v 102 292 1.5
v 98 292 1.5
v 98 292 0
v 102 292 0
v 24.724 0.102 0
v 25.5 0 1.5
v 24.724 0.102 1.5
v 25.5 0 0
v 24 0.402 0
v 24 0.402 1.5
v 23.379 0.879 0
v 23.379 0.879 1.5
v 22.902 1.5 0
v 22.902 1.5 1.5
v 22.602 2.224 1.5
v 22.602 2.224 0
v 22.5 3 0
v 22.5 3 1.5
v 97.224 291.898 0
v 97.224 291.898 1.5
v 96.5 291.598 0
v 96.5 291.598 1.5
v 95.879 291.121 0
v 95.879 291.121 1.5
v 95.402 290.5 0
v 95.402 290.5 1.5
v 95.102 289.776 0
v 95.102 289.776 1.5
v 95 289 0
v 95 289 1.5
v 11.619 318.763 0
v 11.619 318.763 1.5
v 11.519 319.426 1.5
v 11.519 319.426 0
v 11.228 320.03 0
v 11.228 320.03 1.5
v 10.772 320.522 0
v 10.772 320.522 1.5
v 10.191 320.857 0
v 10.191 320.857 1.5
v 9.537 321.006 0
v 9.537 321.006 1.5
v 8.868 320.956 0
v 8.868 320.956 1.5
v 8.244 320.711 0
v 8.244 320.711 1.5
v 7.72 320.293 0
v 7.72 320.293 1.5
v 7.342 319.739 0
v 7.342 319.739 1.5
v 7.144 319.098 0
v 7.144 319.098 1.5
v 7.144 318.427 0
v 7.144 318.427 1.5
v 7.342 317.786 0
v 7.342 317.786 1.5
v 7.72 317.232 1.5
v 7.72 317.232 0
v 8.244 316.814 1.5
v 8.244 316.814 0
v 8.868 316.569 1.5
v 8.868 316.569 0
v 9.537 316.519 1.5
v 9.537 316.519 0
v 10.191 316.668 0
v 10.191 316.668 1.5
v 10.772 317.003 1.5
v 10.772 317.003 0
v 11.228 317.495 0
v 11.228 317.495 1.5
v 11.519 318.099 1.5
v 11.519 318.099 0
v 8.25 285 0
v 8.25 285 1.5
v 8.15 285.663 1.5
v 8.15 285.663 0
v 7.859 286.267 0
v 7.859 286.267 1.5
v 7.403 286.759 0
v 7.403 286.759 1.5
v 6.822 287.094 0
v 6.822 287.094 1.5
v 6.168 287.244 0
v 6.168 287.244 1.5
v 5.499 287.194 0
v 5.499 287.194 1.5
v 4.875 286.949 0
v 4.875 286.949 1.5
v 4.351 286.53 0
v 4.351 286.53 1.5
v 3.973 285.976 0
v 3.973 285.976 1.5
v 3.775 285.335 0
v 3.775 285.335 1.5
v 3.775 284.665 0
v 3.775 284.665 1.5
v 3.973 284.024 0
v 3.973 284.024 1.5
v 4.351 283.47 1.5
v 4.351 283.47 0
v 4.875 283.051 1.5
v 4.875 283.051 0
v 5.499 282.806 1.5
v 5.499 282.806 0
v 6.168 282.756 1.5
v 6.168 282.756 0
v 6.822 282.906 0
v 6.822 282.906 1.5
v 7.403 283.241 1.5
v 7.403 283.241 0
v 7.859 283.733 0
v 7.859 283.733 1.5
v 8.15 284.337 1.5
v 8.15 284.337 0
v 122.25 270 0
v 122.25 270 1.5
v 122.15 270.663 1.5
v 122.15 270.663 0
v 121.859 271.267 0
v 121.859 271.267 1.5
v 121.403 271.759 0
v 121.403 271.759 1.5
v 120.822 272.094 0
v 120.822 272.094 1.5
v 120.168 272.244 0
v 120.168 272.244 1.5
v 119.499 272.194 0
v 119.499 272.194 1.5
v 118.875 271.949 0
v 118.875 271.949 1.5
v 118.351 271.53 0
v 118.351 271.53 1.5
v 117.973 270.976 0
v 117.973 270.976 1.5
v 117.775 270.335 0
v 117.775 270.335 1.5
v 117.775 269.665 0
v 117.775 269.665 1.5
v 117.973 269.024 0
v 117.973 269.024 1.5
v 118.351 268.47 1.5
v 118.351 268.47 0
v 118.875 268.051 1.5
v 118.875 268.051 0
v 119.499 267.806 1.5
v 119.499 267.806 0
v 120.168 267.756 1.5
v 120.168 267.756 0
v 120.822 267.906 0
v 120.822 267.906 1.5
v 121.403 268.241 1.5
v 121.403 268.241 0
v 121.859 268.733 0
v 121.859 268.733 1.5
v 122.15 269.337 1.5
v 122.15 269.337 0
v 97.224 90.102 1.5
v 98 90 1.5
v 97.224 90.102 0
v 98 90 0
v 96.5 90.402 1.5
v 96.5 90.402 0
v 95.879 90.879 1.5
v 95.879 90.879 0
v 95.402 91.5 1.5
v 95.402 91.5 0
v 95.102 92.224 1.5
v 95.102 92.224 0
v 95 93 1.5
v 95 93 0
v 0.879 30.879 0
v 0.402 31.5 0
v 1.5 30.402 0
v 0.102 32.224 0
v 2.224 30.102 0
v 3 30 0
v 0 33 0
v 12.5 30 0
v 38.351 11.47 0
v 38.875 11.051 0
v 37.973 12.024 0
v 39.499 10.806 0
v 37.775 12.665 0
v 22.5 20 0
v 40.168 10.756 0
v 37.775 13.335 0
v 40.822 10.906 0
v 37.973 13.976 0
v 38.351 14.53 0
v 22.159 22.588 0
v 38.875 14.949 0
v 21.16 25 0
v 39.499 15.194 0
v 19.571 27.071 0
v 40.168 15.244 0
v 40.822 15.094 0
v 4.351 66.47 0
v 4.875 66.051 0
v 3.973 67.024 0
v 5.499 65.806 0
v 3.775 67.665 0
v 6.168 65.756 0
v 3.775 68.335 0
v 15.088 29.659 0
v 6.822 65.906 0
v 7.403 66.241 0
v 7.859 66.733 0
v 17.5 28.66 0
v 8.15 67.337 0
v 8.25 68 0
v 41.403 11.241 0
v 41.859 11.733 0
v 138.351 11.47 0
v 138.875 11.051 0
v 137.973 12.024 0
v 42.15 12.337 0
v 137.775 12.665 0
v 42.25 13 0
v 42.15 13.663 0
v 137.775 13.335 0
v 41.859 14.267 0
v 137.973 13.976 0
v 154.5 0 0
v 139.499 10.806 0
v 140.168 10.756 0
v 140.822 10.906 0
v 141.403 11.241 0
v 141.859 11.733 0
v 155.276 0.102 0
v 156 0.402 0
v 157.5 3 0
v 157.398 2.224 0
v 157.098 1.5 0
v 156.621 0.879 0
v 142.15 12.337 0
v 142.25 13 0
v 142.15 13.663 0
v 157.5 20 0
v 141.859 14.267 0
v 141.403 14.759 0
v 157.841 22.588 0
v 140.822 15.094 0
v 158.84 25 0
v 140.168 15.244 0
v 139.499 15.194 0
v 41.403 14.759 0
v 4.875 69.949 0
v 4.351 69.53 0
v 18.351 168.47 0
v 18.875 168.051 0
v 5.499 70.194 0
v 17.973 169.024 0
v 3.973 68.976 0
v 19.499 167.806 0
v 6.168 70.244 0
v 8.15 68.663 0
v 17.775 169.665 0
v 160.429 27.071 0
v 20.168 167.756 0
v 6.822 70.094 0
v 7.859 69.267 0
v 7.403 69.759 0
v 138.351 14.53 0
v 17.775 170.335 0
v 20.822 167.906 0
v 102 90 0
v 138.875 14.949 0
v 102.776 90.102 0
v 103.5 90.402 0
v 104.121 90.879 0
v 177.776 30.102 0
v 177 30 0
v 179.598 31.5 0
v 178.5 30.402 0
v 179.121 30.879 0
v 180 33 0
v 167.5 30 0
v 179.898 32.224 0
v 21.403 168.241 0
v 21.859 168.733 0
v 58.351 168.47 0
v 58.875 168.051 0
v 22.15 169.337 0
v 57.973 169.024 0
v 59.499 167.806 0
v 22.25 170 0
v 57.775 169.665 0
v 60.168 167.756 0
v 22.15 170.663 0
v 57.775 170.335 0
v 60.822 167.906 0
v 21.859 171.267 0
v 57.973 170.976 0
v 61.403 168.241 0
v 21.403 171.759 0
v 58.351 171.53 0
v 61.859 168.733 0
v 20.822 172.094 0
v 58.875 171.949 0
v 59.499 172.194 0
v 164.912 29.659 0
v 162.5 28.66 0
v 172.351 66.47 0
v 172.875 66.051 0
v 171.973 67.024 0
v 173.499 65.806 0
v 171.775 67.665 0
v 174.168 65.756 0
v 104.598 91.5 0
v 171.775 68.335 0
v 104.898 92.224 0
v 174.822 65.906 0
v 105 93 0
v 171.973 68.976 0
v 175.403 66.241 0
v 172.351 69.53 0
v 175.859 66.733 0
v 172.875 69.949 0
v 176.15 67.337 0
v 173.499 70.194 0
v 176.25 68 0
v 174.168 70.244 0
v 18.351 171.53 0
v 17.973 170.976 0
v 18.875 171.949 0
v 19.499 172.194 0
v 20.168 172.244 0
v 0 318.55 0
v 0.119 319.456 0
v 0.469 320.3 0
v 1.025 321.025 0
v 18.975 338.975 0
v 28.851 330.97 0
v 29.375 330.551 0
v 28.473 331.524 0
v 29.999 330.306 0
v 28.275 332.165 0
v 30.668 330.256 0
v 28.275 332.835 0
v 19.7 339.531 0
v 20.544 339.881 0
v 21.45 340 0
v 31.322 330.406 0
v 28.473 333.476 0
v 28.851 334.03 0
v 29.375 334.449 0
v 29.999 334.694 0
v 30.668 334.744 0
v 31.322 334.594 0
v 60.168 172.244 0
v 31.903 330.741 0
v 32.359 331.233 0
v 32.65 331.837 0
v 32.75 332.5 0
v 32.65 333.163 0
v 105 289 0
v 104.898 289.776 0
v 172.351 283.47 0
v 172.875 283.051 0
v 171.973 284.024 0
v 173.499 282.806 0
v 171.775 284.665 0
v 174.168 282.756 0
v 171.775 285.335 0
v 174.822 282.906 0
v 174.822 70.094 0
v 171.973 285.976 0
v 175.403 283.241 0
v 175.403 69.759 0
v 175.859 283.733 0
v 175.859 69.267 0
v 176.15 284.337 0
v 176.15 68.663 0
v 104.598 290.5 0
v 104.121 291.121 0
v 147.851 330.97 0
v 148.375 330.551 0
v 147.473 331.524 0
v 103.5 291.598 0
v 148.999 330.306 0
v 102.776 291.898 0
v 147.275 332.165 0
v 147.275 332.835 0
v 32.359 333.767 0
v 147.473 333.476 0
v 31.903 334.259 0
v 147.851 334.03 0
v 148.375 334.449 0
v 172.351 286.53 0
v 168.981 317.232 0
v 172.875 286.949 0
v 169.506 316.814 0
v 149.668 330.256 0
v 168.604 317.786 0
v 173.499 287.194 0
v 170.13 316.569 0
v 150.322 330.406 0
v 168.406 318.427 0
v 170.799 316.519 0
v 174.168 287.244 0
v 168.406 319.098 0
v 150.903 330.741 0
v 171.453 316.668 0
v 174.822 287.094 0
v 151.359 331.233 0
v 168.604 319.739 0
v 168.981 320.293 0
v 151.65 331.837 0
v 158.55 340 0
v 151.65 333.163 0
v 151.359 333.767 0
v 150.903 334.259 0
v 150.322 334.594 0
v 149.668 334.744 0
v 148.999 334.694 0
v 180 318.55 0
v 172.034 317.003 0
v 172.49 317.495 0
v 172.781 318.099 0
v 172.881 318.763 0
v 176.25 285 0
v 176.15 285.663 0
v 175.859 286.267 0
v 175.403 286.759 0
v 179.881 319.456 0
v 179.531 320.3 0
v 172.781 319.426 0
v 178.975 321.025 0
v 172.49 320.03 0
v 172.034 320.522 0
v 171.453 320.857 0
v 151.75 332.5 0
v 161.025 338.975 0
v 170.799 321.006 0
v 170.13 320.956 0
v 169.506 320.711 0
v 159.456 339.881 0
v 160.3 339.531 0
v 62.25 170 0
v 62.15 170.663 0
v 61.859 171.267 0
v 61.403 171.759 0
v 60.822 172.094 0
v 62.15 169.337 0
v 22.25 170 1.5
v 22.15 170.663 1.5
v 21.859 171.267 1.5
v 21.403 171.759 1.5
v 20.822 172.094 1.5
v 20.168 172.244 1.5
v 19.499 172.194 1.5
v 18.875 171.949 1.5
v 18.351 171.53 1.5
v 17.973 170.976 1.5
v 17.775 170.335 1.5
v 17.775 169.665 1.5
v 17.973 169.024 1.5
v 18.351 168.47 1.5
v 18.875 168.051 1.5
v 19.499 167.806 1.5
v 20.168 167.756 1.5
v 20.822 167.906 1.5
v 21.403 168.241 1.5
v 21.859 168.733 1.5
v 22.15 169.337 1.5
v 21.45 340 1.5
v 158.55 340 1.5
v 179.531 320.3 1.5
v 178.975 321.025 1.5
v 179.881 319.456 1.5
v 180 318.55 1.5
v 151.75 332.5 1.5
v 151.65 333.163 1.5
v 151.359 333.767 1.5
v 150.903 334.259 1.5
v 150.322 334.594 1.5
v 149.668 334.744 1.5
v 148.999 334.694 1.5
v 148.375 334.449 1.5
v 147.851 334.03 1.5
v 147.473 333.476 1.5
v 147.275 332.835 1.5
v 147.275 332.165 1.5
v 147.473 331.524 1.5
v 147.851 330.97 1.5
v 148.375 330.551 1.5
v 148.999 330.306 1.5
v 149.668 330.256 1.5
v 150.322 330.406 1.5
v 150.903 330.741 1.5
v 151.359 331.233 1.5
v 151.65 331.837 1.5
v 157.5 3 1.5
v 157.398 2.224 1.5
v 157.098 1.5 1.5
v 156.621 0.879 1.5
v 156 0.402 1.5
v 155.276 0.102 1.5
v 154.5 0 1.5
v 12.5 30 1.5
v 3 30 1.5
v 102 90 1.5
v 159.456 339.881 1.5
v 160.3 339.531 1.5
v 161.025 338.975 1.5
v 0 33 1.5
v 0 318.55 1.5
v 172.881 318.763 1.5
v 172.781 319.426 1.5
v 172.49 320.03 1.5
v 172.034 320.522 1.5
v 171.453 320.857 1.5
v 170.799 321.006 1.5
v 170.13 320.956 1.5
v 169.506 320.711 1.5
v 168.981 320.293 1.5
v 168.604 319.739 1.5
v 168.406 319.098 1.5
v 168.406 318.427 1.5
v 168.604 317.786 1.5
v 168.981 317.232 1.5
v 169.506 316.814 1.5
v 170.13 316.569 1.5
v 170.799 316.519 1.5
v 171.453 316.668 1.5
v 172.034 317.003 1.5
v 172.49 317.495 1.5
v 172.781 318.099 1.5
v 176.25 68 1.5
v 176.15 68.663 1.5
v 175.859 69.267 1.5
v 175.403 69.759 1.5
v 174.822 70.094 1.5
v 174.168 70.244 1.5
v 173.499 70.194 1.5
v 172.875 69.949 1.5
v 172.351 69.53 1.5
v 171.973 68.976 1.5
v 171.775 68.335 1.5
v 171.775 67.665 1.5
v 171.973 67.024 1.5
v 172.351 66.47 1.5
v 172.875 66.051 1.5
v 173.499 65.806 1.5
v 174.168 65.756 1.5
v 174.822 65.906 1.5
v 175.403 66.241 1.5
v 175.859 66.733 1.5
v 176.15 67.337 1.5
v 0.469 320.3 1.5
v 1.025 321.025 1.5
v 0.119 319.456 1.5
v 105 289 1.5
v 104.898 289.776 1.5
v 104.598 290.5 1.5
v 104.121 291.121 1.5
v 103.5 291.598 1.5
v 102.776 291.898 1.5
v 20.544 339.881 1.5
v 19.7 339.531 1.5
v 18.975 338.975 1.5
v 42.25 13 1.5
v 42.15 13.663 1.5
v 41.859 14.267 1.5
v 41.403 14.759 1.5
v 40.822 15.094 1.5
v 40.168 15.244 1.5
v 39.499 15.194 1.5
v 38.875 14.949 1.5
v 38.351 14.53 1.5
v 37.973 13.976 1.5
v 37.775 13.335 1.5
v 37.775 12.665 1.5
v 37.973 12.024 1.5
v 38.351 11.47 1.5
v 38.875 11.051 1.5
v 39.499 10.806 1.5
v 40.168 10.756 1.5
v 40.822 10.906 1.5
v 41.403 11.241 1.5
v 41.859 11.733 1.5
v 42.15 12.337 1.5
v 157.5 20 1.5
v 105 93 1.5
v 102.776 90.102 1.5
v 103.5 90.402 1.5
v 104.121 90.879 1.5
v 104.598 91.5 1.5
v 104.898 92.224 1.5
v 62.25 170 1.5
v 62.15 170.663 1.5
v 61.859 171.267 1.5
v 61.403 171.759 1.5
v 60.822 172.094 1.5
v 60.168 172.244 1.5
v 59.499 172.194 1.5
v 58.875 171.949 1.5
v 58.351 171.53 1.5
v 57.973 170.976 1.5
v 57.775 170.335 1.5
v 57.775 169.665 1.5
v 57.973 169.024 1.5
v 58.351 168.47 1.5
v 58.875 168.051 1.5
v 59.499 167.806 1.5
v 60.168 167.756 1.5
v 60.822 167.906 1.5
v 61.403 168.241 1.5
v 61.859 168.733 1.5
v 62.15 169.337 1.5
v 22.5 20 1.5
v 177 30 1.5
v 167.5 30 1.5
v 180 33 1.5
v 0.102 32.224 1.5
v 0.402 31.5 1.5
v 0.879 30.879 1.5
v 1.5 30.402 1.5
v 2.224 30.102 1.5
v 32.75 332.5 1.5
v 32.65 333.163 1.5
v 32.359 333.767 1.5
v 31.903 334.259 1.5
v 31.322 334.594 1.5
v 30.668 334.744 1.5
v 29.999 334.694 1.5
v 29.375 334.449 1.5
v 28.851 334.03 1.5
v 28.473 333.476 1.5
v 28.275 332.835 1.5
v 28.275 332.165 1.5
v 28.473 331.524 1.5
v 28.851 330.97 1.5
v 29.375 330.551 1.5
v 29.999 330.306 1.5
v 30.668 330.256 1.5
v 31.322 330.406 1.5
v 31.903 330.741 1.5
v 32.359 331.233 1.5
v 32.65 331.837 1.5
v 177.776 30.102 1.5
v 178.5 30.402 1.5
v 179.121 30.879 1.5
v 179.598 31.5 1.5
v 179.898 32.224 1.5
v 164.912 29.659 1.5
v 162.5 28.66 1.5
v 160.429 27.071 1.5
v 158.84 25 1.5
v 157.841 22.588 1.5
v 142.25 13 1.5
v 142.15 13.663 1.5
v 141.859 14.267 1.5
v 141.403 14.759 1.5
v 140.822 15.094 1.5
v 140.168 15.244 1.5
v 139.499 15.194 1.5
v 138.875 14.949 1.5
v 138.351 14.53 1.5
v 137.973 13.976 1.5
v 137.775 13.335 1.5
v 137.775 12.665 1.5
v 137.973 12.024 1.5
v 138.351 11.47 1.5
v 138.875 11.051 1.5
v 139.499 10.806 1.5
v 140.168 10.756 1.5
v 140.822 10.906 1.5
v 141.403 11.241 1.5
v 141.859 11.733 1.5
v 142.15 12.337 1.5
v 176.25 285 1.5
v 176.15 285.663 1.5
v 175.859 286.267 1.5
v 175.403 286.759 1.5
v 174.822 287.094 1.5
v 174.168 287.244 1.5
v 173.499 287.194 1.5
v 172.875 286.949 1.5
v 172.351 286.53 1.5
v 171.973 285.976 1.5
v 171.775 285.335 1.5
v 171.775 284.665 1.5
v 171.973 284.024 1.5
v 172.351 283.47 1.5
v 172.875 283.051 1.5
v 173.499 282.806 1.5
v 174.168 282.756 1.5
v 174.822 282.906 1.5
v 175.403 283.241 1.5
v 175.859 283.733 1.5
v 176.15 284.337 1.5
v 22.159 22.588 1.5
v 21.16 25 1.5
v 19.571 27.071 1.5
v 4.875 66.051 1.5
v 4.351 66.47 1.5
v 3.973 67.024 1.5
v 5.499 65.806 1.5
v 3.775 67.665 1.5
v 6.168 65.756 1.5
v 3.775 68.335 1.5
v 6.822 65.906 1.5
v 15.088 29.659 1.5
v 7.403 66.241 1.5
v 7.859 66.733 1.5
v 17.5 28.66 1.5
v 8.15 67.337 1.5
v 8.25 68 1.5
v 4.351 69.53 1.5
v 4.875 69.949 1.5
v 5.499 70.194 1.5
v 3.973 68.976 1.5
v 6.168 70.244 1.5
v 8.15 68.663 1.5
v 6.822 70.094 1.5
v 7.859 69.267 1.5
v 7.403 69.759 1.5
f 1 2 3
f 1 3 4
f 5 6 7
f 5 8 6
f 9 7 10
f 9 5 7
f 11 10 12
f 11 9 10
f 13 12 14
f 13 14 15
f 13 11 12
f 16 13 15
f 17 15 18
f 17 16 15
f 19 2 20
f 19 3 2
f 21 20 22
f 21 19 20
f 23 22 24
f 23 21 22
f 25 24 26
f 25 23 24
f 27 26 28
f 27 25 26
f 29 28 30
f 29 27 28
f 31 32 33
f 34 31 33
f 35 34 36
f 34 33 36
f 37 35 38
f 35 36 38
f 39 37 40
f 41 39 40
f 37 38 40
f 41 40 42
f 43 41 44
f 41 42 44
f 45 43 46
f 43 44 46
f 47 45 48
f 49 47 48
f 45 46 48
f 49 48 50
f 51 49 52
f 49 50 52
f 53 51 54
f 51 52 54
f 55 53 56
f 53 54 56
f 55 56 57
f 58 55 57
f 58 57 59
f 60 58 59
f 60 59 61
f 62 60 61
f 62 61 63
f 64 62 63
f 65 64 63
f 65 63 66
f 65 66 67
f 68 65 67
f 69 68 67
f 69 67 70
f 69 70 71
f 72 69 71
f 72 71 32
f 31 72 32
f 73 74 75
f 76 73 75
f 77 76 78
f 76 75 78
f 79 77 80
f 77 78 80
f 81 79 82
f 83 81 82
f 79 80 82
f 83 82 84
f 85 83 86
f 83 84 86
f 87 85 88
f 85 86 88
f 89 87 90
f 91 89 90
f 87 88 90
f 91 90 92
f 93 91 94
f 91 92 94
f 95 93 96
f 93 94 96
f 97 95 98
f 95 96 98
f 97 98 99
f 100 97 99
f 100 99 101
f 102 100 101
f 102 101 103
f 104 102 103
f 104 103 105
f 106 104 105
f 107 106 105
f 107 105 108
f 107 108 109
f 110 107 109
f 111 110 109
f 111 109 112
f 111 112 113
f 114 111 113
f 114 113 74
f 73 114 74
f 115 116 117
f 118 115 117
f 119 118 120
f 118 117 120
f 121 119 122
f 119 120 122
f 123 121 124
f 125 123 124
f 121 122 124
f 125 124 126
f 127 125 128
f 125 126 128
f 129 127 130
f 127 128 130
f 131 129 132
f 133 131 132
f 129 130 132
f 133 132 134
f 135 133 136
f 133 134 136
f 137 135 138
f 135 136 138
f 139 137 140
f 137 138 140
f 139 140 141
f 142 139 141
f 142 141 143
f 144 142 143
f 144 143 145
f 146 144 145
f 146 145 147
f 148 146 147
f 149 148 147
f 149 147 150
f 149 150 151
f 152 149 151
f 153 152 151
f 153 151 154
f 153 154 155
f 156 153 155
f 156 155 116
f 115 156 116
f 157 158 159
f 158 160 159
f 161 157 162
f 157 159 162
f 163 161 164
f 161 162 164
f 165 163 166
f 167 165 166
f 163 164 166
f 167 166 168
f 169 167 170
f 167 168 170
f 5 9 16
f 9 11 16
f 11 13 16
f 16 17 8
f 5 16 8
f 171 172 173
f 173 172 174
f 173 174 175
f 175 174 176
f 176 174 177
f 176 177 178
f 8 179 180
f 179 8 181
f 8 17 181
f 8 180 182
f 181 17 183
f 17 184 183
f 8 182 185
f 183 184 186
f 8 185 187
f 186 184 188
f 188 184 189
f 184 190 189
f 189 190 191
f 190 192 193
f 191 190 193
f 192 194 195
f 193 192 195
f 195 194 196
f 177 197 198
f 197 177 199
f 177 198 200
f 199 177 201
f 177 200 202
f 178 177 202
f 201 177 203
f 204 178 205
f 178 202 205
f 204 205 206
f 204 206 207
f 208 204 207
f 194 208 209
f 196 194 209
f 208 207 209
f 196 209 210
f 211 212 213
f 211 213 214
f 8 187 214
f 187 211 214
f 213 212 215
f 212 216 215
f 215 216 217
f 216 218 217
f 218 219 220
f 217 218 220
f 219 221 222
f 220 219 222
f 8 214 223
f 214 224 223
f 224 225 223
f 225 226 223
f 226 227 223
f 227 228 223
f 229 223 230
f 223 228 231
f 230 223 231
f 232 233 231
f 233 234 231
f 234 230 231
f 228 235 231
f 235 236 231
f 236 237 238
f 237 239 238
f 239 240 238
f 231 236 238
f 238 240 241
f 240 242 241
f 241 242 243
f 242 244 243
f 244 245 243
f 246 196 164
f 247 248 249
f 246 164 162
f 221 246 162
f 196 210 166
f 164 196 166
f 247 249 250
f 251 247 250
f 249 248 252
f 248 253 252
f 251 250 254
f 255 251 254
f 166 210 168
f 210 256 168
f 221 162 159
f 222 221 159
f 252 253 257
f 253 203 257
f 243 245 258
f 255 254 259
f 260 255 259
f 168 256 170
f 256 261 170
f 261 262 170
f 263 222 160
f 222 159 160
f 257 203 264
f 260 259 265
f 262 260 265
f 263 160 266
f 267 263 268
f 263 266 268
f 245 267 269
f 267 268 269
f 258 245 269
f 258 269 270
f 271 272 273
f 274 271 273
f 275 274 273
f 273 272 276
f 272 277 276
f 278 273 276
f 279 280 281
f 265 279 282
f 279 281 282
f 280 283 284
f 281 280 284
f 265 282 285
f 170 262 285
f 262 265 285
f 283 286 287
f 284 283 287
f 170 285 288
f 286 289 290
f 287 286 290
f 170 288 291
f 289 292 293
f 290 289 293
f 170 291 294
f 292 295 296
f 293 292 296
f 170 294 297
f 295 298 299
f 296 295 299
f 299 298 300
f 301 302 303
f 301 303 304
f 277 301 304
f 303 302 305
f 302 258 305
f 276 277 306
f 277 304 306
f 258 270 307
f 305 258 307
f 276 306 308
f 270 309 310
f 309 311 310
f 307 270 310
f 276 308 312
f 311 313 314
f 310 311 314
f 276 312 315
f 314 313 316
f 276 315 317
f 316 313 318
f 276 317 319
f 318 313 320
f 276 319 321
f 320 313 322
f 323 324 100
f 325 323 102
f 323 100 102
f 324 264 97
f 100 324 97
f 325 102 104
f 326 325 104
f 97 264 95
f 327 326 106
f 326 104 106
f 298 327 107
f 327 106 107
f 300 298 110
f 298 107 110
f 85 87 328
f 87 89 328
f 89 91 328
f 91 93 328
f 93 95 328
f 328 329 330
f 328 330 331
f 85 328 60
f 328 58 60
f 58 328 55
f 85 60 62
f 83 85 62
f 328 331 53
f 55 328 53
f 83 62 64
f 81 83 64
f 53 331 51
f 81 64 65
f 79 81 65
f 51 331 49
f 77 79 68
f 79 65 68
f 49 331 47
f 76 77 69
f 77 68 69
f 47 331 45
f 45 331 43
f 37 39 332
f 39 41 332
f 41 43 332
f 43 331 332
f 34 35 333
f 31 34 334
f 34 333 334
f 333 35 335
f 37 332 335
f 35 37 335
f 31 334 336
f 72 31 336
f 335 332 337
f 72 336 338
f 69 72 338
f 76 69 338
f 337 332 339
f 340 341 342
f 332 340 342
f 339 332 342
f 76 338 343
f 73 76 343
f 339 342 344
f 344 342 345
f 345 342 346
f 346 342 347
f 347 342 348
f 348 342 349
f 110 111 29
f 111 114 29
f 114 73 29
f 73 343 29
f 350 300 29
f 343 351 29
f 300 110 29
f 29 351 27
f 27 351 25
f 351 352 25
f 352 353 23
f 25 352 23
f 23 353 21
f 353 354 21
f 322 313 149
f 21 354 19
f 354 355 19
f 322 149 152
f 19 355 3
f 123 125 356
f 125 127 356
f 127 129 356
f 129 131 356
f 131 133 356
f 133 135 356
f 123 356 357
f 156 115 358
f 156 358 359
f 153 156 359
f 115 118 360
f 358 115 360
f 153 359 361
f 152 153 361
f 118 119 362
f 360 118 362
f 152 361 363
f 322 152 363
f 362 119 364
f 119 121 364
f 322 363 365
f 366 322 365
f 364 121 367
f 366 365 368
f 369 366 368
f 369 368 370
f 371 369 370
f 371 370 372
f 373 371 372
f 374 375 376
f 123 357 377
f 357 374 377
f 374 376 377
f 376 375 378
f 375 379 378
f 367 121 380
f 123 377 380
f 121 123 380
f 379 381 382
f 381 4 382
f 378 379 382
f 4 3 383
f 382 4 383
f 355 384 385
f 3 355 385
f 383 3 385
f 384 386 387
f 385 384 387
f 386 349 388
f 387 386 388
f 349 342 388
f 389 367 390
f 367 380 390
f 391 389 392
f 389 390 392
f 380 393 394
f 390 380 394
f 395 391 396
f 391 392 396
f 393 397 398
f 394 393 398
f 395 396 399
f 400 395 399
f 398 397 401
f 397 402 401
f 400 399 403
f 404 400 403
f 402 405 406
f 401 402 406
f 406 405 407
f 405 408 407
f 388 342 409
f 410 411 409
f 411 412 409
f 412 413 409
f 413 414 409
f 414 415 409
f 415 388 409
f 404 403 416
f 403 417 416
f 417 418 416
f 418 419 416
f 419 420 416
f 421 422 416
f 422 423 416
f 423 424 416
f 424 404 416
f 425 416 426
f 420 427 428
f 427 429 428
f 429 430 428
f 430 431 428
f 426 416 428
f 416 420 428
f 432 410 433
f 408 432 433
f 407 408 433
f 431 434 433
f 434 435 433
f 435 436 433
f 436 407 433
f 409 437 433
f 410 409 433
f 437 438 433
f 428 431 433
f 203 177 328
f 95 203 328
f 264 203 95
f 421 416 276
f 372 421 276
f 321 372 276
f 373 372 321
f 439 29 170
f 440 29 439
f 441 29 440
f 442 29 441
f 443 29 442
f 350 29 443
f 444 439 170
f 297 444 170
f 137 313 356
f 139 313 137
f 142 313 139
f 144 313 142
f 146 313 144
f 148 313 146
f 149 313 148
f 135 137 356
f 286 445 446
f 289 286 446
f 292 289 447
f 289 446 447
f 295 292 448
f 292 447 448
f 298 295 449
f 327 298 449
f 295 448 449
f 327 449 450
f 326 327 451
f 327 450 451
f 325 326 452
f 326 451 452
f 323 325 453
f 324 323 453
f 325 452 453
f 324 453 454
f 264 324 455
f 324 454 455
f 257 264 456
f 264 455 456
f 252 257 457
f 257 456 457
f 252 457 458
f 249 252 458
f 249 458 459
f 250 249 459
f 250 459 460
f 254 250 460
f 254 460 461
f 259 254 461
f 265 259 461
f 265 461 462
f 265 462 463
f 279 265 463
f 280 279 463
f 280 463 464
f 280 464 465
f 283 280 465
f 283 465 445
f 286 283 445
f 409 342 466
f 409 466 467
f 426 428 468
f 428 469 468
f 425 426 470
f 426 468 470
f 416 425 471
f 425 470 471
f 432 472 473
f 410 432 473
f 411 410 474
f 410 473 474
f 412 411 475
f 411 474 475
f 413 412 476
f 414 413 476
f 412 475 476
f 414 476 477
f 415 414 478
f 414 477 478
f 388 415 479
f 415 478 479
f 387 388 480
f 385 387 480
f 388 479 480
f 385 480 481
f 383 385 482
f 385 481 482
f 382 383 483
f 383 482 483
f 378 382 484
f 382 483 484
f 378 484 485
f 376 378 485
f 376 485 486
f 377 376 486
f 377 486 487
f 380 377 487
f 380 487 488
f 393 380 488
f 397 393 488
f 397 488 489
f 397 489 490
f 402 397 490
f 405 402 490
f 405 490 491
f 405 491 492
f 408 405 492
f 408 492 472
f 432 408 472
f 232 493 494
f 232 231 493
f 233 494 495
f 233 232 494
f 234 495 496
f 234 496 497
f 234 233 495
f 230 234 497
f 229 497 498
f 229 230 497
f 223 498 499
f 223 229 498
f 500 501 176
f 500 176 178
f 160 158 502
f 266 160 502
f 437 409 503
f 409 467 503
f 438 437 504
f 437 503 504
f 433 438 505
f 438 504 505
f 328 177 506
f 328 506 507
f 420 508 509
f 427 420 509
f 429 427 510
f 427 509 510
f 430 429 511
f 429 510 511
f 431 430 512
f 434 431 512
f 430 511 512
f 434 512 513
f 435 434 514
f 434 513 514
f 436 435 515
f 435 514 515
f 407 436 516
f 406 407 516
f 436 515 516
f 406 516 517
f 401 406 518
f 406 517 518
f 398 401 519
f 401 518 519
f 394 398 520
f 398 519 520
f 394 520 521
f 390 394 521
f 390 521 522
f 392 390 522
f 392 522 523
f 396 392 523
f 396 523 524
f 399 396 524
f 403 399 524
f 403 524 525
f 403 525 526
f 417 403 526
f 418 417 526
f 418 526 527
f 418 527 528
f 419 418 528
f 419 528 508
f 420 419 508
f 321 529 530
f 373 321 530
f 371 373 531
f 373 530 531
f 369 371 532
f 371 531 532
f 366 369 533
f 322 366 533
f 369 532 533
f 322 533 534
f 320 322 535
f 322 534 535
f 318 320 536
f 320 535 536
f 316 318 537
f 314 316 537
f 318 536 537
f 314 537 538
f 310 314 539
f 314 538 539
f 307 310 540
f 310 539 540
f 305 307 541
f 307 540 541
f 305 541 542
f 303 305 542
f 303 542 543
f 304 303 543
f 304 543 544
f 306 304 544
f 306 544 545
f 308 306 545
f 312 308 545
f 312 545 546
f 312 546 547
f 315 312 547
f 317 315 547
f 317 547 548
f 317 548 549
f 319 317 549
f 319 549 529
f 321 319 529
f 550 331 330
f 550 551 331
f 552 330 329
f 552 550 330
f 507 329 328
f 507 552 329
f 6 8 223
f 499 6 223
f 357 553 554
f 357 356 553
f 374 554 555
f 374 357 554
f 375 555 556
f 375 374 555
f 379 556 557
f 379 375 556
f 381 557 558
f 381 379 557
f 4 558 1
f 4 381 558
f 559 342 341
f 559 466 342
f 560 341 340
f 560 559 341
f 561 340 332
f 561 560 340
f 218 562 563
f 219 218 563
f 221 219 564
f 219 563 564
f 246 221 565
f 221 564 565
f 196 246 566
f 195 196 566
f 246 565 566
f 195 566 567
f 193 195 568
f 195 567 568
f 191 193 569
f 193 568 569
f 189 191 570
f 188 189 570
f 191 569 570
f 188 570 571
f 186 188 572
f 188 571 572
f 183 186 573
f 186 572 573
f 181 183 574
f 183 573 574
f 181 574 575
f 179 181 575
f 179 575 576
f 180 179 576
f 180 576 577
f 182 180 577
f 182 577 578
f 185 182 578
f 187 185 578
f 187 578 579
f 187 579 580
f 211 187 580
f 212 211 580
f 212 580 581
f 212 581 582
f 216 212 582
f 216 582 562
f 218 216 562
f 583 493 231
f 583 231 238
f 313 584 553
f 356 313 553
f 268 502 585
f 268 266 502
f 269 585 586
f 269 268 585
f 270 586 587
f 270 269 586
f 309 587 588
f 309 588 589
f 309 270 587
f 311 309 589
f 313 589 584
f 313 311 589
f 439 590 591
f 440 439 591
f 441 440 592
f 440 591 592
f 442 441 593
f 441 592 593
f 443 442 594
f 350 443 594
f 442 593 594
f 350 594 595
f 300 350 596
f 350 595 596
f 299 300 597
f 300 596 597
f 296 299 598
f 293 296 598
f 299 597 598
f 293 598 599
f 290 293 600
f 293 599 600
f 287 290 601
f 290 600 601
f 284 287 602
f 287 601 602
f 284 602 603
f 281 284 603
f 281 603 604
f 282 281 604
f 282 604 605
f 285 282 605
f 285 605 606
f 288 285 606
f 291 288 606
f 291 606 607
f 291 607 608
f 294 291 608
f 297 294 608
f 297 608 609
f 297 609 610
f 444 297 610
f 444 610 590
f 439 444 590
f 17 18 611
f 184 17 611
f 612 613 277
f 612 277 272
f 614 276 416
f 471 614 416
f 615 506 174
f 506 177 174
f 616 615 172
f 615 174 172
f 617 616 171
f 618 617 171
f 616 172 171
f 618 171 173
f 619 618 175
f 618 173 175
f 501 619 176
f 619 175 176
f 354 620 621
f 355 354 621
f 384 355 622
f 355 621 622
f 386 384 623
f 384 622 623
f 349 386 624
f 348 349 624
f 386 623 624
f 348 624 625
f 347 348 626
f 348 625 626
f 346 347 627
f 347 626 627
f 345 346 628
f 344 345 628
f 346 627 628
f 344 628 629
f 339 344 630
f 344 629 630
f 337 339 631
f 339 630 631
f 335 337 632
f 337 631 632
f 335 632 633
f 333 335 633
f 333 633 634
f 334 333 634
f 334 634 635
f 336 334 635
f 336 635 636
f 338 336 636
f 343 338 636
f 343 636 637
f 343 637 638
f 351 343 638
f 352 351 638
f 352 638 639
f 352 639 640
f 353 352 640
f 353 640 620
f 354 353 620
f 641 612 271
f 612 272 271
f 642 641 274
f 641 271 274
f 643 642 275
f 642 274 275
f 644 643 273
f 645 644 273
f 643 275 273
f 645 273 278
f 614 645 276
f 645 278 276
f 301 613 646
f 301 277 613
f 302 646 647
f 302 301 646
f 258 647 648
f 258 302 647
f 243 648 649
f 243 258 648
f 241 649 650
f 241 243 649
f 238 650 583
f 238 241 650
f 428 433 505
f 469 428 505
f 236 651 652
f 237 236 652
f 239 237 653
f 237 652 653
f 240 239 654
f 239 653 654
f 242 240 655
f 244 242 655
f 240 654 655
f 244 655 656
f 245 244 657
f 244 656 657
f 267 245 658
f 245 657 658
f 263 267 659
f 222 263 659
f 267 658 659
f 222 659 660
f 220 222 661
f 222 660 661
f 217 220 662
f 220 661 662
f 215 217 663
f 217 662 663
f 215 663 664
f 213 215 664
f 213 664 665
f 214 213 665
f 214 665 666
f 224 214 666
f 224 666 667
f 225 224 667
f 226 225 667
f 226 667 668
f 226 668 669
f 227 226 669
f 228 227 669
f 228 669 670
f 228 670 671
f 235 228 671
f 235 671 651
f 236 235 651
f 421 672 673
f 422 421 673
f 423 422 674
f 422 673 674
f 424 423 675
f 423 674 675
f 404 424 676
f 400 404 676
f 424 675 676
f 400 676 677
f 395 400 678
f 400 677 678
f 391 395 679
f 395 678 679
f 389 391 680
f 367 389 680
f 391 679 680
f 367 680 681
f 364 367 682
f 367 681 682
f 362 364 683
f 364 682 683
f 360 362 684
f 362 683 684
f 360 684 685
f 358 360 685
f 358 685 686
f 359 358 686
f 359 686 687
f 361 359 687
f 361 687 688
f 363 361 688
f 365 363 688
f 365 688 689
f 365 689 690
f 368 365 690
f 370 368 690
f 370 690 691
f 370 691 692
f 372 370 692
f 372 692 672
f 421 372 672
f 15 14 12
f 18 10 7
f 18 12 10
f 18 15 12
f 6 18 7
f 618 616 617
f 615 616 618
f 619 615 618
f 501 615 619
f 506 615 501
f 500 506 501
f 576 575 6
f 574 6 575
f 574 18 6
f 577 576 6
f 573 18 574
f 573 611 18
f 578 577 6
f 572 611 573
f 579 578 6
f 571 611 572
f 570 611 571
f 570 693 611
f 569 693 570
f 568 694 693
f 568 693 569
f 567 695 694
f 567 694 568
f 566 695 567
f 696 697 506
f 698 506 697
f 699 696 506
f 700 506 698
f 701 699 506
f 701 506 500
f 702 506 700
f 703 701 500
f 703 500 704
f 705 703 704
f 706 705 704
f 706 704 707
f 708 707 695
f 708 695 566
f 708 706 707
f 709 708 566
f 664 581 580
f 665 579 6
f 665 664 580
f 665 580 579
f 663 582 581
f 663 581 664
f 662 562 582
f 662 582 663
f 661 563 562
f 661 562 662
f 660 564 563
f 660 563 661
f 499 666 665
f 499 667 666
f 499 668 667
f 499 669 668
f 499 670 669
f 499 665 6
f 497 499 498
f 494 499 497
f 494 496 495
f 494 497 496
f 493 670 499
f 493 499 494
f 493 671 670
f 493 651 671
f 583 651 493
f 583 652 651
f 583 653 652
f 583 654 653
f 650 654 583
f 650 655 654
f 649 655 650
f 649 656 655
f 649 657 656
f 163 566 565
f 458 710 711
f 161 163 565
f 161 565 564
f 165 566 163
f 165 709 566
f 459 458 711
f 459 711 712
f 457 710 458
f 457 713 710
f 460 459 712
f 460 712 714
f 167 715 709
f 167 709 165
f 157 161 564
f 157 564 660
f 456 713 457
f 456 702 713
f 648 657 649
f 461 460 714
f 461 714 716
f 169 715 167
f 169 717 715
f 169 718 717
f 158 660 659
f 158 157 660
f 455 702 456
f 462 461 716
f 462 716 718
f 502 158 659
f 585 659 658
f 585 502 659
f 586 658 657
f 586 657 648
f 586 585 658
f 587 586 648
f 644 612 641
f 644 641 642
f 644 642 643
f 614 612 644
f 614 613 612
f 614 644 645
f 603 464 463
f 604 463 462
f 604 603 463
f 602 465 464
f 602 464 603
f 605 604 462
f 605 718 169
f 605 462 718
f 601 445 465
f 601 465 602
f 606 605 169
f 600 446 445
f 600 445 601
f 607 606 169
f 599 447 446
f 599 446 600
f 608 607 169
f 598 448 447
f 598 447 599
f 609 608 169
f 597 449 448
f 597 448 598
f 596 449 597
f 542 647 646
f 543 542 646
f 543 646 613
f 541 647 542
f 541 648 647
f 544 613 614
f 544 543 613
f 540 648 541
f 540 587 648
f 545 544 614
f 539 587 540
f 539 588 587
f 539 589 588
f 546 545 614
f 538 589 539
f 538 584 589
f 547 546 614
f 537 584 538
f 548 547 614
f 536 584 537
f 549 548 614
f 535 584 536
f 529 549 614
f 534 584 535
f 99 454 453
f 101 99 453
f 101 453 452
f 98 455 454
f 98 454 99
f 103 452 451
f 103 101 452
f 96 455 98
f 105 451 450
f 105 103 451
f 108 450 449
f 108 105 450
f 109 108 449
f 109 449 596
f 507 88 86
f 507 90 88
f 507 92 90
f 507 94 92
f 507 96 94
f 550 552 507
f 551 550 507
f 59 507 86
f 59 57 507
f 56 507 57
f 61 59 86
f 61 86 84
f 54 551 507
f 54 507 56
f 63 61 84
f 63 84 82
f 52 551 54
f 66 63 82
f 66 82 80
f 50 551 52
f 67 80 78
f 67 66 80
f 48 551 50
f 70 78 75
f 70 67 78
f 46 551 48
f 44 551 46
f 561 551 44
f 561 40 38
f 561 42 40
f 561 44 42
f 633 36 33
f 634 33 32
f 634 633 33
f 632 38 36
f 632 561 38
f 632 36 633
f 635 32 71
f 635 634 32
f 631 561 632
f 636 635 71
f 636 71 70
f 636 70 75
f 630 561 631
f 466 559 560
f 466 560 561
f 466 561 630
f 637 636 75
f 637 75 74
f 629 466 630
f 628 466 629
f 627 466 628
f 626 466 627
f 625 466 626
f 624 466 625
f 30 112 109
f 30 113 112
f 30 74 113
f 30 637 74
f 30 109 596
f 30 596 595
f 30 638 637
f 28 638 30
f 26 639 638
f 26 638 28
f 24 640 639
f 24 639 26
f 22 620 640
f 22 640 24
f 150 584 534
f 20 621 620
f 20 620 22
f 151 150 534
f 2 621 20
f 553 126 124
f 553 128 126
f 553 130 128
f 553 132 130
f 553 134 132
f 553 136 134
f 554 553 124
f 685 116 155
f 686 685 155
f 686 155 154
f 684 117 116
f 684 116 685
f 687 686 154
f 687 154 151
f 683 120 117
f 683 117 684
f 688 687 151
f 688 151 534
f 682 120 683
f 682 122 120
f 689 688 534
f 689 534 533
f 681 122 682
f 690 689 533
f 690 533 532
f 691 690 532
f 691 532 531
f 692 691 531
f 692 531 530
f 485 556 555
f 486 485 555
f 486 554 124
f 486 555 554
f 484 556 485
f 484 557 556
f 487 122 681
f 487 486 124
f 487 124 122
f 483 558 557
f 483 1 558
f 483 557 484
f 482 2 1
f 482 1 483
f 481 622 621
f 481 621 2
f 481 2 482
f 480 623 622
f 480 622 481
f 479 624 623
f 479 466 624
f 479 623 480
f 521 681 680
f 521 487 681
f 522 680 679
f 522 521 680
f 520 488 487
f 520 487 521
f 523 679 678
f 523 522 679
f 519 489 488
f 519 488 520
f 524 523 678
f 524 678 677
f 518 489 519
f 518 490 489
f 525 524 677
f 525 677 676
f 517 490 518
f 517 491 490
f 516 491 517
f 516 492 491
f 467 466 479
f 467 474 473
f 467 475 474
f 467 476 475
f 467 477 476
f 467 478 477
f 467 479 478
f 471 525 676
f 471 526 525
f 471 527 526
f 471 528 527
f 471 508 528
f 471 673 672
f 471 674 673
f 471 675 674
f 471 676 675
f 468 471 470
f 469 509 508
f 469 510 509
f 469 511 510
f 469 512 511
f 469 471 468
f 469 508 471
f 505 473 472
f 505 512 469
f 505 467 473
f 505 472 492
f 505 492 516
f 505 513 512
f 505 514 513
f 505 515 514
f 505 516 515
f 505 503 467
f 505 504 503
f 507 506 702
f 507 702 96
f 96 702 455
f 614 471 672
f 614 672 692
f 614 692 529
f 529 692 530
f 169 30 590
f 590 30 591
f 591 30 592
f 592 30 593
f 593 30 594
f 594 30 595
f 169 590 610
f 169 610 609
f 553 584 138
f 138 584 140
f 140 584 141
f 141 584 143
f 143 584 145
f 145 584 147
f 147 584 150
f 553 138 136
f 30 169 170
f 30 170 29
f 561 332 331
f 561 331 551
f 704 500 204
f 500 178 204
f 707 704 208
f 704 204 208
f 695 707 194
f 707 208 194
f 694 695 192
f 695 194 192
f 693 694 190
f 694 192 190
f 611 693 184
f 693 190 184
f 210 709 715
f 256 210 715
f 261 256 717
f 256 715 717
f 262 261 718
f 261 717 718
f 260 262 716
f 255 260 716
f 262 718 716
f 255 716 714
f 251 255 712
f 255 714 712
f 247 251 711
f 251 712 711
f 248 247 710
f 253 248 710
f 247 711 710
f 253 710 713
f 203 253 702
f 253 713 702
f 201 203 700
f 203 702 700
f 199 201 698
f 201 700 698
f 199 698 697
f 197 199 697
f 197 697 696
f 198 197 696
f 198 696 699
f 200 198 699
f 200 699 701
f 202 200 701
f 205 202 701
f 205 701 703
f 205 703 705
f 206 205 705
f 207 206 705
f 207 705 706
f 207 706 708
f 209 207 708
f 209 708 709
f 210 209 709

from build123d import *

# Parameters (mm, degrees)
ESQUISSE1_W                  = 180
ESQUISSE1_H                  = 340
BOSS_EXTRU_1_DEPTH           = 1.5
ESQUISSE2_R                  = 2.25
ENL_V_MAT_EXTRU_1_DEPTH      = 1
ENL_V_MAT_EXTRU_1_DEPTH_BACK = 2.5
ESQUISSE3_W                  = 22.5
ESQUISSE3_H                  = 30
ENL_V_MAT_EXTRU_2_DEPTH      = 1
ENL_V_MAT_EXTRU_2_DEPTH_BACK = 2.5
CONG_1_R                     = 10
CONG_2_R                     = 3
ESQUISSE4_W                  = 10
ESQUISSE4_H                  = 202
ENL_V_MAT_EXTRU_3_DEPTH      = 1
ENL_V_MAT_EXTRU_3_DEPTH_BACK = 2.5
CONG_3_R                     = 3
CHANFREIN1_SIZE              = 20
CHANFREIN2_SIZE              = 20
ESQUISSE5_R                  = 2.25
ENL_V_MAT_EXTRU_4_DEPTH      = 2.5
ESQUISSE6_R                  = 2.25
ENL_V_MAT_EXTRU_5_DEPTH      = 1
ENL_V_MAT_EXTRU_5_DEPTH_BACK = 2.5
CONG_4_R                     = 3.5


with BuildPart() as part:
    # Esquisse1 → Boss.-Extru.1 (new body)
    with BuildSketch(Plane.XY):
        with Locations((90, 170)):
            Rectangle(ESQUISSE1_W, ESQUISSE1_H)
    extrude(amount=BOSS_EXTRU_1_DEPTH)

    # Esquisse2 → Enlèv. mat.-Extru.1 (cut, two sides)
    with BuildSketch(Plane.XY.offset(1.5)) as enl_v_mat_extru_1_sk:
        with Locations((40, 13)):
            Circle(ESQUISSE2_R)
        with Locations((140, 13)):
            Circle(ESQUISSE2_R)
    extrude(amount=ENL_V_MAT_EXTRU_1_DEPTH, mode=Mode.SUBTRACT)
    extrude(enl_v_mat_extru_1_sk.sketch, amount=-ENL_V_MAT_EXTRU_1_DEPTH_BACK, mode=Mode.SUBTRACT)

    # Esquisse3 → Enlèv. mat.-Extru.2 (cut, two sides)
    with BuildSketch(Plane.XY.offset(1.5)) as enl_v_mat_extru_2_sk:
        with Locations((11.25, 15)):
            Rectangle(ESQUISSE3_W, ESQUISSE3_H)
        with Locations((168.75, 15)):
            Rectangle(ESQUISSE3_W, ESQUISSE3_H)
    extrude(amount=ENL_V_MAT_EXTRU_2_DEPTH, mode=Mode.SUBTRACT)
    extrude(enl_v_mat_extru_2_sk.sketch, amount=-ENL_V_MAT_EXTRU_2_DEPTH_BACK, mode=Mode.SUBTRACT)

    # Congé1
    cong_1_edges = [part.edges().sort_by_distance(p)[0] for p in [
        (22.5, 30, 0.75),
        (157.5, 30, 0.75),
    ]]
    fillet(cong_1_edges, radius=CONG_1_R)

    # Congé2
    cong_2_edges = [part.edges().sort_by_distance(p)[0] for p in [
        (0, 30, 0.75),
        (22.5, 0, 0.75),
        (180, 30, 0.75),
        (157.5, 0, 0.75),
    ]]
    fillet(cong_2_edges, radius=CONG_2_R)

    # Esquisse4 → Enlèv. mat.-Extru.3 (cut, two sides)
    with BuildSketch(Plane.XY.offset(1.5)) as enl_v_mat_extru_3_sk:
        with Locations((100, 191)):
            Rectangle(ESQUISSE4_W, ESQUISSE4_H)
    extrude(amount=ENL_V_MAT_EXTRU_3_DEPTH, mode=Mode.SUBTRACT)
    extrude(enl_v_mat_extru_3_sk.sketch, amount=-ENL_V_MAT_EXTRU_3_DEPTH_BACK, mode=Mode.SUBTRACT)

    # Congé3
    cong_3_edges = [part.edges().sort_by_distance(p)[0] for p in [
        (95, 90, 0.75),
        (95, 292, 0.75),
        (105, 292, 0.75),
        (105, 90, 0.75),
    ]]
    fillet(cong_3_edges, radius=CONG_3_R)

    # Chanfrein1
    chanfrein1_edges = [part.edges().sort_by_distance(p)[0] for p in [
        (180, 340, 0.75),
    ]]
    chamfer(chanfrein1_edges, length=CHANFREIN1_SIZE)

    # Chanfrein2
    chanfrein2_edges = [part.edges().sort_by_distance(p)[0] for p in [
        (0, 340, 0.75),
    ]]
    chamfer(chanfrein2_edges, length=CHANFREIN2_SIZE)

    # Esquisse5 → Enlèv. mat.-Extru.4 (cut, through all)
    with BuildSketch(Plane.XY.offset(1.5)):
        with Locations((120, 270)):
            Circle(ESQUISSE5_R)
    extrude(amount=-ENL_V_MAT_EXTRU_4_DEPTH, mode=Mode.SUBTRACT)

    # Esquisse6 → Enlèv. mat.-Extru.5 (cut, two sides)
    with BuildSketch(Plane.XY.offset(1.5)) as enl_v_mat_extru_5_sk:
        with Locations((6, 285)):
            Circle(ESQUISSE6_R)
        with Locations((6, 68)):
            Circle(ESQUISSE6_R)
        with Locations((174, 68)):
            Circle(ESQUISSE6_R)
        with Locations((174, 285)):
            Circle(ESQUISSE6_R)
        with Locations((20, 170)):
            Circle(ESQUISSE6_R)
        with Locations((60, 170)):
            Circle(ESQUISSE6_R)
        with Locations((149.5, 332.5)):
            Circle(ESQUISSE6_R)
        with Locations((170.630835149, 318.762563133)):
            Circle(ESQUISSE6_R)
        with Locations((9.369164851, 318.762563133)):
            Circle(ESQUISSE6_R)
        with Locations((30.5, 332.5)):
            Circle(ESQUISSE6_R)
    extrude(amount=ENL_V_MAT_EXTRU_5_DEPTH, mode=Mode.SUBTRACT)
    extrude(enl_v_mat_extru_5_sk.sketch, amount=-ENL_V_MAT_EXTRU_5_DEPTH_BACK, mode=Mode.SUBTRACT)

    # Congé4
    cong_4_edges = [part.edges().sort_by_distance(p)[0] for p in [
        (160, 340, 0.75),
        (180, 320, 0.75),
        (0, 320, 0.75),
        (20, 340, 0.75),
    ]]
    fillet(cong_4_edges, radius=CONG_4_R)


solid = part.part
